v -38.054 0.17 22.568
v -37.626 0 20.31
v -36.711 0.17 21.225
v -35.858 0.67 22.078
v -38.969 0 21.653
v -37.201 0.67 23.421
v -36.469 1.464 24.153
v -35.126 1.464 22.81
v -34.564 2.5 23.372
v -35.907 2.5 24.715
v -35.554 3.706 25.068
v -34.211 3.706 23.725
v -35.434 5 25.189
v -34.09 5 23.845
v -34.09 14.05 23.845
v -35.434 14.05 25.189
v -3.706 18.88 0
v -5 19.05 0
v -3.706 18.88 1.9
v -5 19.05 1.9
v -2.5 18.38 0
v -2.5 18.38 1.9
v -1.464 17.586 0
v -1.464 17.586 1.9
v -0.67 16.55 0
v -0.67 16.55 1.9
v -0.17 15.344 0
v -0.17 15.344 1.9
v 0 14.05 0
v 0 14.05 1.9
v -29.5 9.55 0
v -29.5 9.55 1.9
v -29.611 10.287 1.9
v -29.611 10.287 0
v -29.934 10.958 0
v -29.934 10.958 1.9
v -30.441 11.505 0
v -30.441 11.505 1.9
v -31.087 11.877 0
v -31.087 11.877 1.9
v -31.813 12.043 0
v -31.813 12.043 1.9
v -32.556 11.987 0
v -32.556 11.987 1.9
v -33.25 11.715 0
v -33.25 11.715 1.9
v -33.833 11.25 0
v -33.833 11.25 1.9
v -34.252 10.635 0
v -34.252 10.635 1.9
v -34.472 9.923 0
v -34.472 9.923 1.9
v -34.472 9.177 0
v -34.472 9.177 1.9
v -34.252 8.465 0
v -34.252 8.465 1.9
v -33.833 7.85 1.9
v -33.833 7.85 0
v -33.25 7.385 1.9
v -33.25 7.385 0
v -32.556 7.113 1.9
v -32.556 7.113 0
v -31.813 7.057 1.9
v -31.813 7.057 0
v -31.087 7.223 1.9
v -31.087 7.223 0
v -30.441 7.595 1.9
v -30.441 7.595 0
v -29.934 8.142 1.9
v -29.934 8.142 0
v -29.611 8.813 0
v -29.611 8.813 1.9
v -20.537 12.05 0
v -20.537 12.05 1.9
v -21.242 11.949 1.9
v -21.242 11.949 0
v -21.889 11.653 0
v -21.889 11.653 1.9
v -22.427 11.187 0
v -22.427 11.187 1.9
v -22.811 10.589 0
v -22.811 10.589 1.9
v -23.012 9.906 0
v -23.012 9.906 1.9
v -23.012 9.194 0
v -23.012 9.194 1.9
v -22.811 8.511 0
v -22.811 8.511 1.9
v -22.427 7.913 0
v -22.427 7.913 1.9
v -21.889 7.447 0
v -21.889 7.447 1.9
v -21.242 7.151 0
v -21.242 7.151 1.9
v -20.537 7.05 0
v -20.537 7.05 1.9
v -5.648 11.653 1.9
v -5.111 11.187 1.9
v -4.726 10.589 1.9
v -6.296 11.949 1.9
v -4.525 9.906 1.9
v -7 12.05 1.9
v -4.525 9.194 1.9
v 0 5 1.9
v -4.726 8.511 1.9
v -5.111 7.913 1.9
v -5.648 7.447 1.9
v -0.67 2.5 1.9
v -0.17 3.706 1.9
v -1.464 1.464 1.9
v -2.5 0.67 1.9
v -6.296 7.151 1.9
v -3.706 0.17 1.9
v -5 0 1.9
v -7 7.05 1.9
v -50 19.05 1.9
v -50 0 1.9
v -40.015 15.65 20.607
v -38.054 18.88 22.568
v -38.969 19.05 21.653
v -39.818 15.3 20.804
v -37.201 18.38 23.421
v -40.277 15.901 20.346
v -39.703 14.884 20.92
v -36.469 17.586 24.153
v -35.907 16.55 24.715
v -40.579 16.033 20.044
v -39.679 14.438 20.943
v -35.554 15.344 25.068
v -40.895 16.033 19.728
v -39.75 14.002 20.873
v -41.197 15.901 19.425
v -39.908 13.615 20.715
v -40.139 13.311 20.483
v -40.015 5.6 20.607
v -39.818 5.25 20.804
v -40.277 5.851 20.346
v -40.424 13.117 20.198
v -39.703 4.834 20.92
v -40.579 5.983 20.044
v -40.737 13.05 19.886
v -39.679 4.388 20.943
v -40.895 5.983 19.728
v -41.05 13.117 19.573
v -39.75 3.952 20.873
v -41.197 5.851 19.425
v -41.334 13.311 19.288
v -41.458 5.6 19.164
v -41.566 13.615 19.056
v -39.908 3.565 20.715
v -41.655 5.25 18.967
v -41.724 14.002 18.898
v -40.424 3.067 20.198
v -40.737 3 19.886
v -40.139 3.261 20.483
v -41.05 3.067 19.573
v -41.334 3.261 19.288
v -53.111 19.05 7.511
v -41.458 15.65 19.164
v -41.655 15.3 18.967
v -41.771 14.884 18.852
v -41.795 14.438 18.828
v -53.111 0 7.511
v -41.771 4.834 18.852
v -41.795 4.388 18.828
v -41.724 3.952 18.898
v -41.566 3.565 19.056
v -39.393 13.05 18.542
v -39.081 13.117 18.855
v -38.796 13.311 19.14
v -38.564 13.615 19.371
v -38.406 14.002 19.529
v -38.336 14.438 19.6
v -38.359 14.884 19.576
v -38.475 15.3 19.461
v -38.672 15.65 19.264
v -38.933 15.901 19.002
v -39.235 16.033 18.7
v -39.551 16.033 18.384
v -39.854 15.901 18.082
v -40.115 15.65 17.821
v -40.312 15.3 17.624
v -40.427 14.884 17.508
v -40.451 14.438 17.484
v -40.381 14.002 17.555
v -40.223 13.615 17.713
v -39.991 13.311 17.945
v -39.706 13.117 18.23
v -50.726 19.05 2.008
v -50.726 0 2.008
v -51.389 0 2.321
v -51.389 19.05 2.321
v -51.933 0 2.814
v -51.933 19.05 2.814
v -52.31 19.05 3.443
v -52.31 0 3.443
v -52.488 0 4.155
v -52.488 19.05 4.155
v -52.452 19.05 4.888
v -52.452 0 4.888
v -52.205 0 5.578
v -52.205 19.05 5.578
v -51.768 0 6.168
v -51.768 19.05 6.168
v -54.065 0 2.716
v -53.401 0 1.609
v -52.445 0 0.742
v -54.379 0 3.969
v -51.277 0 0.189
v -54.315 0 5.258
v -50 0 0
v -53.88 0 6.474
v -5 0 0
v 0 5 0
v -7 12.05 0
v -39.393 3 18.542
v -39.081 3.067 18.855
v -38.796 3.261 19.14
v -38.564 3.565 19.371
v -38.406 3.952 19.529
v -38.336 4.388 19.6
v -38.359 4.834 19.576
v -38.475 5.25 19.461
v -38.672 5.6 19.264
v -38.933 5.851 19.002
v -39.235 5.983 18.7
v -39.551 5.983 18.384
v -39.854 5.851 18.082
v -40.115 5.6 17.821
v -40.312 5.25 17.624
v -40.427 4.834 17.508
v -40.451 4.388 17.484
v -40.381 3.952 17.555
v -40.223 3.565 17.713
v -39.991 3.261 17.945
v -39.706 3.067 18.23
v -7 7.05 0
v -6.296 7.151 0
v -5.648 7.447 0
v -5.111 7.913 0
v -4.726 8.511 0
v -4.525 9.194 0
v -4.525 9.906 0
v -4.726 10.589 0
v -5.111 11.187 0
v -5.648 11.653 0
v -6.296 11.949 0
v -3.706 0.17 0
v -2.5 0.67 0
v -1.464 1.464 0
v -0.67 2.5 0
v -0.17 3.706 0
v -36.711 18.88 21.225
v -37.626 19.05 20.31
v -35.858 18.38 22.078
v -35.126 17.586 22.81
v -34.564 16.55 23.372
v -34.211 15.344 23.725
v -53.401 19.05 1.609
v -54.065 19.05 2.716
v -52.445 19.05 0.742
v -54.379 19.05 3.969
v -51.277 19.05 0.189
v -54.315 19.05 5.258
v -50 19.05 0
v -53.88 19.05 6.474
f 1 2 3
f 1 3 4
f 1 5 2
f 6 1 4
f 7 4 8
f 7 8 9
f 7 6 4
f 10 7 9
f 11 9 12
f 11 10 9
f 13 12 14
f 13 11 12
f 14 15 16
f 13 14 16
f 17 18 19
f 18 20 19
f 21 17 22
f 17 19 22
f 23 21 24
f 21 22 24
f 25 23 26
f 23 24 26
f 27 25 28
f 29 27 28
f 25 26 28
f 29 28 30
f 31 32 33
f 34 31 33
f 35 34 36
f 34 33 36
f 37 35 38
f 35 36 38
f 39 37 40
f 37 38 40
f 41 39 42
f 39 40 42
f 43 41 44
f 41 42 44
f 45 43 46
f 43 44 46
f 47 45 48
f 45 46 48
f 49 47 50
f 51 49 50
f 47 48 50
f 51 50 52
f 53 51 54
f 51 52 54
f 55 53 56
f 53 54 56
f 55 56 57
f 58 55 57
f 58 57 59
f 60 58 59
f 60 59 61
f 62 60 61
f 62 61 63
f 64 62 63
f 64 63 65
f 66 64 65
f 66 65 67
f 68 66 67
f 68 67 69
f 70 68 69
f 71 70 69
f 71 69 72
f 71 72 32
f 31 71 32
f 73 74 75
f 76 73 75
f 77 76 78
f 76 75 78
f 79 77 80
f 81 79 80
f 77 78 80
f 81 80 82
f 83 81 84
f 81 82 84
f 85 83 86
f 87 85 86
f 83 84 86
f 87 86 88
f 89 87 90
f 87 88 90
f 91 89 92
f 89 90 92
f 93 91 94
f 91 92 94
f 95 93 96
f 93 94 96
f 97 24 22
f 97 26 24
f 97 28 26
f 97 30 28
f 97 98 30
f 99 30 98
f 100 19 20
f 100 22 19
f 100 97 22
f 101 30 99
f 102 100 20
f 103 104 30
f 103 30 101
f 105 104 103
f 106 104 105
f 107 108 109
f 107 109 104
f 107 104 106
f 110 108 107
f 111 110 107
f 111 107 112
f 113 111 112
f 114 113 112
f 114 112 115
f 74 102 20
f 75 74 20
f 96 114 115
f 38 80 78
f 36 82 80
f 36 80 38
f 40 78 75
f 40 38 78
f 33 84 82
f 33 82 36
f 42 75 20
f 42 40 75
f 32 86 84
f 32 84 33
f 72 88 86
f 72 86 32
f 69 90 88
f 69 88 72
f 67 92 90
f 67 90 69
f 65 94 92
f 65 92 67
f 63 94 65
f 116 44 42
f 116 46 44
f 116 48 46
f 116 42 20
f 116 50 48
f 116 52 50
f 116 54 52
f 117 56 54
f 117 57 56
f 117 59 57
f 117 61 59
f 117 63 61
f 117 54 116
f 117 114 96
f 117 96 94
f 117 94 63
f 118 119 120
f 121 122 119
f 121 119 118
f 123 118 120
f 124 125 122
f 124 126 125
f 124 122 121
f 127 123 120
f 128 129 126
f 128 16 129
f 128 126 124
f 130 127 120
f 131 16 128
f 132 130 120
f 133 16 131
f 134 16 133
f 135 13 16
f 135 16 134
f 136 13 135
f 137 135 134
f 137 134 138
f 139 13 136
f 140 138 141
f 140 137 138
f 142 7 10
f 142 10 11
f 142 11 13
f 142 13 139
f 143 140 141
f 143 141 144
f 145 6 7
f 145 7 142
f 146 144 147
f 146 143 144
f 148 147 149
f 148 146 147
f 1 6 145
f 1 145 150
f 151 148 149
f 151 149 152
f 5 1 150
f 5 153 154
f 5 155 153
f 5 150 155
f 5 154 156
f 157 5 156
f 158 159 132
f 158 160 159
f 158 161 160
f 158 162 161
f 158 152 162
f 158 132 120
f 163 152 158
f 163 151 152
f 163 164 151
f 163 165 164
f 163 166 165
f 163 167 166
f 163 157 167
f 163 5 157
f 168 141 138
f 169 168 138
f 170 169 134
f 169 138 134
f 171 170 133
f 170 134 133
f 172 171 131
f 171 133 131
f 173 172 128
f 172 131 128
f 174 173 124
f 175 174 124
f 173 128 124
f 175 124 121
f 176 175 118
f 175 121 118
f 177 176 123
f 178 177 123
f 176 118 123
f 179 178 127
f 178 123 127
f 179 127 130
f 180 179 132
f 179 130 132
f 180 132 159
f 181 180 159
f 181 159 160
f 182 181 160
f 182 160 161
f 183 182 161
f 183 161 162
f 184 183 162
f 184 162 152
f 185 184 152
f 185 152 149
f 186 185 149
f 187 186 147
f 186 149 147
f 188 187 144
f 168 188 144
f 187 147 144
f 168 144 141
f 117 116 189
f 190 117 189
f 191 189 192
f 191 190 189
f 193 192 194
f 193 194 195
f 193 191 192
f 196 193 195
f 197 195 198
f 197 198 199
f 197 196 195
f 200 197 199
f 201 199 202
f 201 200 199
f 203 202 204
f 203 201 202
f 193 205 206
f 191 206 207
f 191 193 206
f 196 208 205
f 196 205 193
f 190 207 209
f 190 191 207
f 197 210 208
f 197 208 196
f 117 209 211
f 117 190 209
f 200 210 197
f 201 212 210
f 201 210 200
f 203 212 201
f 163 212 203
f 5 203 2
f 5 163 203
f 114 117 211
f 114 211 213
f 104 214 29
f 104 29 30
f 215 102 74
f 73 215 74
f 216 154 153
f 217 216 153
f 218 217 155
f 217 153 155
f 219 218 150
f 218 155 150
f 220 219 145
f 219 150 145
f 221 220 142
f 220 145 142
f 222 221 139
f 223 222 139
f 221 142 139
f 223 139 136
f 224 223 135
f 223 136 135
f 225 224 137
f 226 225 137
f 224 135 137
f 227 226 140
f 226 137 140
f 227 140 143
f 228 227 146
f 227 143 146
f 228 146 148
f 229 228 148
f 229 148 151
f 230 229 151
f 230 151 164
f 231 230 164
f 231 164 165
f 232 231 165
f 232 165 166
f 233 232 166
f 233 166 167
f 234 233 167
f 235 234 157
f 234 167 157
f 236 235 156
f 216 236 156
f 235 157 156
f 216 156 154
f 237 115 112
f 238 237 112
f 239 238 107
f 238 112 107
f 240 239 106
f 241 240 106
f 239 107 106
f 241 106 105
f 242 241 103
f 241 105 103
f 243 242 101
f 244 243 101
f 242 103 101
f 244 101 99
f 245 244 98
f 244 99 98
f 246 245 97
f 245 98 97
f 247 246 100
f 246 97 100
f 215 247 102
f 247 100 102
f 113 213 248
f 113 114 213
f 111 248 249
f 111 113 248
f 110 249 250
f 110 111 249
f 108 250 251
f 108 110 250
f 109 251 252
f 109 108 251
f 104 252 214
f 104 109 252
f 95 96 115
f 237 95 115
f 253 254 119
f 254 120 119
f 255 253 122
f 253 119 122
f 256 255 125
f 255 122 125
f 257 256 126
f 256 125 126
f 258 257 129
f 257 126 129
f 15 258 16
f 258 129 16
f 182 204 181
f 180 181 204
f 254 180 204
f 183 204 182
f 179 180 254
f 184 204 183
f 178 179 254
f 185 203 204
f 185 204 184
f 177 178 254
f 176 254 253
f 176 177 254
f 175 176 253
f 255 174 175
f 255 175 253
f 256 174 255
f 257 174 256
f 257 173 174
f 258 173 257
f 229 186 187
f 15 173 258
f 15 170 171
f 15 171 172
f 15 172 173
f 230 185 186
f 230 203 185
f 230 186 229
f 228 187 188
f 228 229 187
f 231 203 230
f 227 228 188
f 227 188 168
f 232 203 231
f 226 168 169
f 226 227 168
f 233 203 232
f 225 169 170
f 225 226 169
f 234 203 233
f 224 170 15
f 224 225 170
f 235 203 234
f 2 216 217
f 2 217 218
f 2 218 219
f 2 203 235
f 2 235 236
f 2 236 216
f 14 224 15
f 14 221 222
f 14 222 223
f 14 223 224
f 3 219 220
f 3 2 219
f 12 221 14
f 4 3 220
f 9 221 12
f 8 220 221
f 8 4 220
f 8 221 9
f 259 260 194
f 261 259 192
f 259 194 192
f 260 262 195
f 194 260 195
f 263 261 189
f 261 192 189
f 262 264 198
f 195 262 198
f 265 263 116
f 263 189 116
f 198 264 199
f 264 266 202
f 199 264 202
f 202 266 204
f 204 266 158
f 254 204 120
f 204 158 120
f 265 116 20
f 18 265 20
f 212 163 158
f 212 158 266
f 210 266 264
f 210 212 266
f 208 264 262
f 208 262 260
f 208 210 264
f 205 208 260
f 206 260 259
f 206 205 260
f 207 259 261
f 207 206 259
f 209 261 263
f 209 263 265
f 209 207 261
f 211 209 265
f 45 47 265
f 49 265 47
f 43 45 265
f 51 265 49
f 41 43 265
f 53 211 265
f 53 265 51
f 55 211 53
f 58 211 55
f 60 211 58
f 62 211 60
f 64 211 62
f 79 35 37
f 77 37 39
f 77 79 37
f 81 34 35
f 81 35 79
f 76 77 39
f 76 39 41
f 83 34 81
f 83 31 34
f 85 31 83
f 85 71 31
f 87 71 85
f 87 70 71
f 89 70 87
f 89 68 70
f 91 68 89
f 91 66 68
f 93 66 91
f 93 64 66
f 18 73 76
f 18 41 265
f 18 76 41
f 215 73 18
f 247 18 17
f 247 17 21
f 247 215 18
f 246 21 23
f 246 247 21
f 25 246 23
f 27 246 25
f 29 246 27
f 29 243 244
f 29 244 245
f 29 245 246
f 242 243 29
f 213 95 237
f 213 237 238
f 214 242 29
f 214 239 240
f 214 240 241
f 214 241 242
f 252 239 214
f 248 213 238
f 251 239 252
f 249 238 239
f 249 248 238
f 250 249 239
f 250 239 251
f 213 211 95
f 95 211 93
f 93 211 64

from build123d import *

# Parameters (mm, degrees)
F1_DEPTH = 19.05
F2_R     = 1.5
F3_DEPTH = 1.9
F4_R     = 2.5
F5_DEPTH = 25
F6_R     = 5


with BuildPart() as f1:
    # F0 (on Front) → F1 (new body)
    with BuildSketch(Plane.XZ):
        with BuildLine():
            Line((-50, 0), (0, 0))
            Line((0, 0), (0, 1.9))
            Line((0, 1.9), (-50, 1.9))
            ThreePointArc((-50, 1.9), (-52.3096988313, 3.4432914191), (-51.767766953, 6.167766953))
            Line((-51.767766953, 6.167766953), (-34.0900974233, 23.8454364826))
            Line((-34.0900974233, 23.8454364826), (-35.4336003076, 25.1889393669))
            Line((-35.4336003076, 25.1889393669), (-53.1112698372, 7.5112698372))
            ThreePointArc((-53.1112698372, 7.5112698372), (-54.065069943, 2.7161928976), (-50, 0))
        make_face()
    extrude(amount=-F1_DEPTH)

    # F2 (on face) → F3 (cut, through all)
    with BuildSketch(Plane(origin=(-30.3112698372, 0, 30.3112698372), x_dir=(0, -1, 0), z_dir=(-0.7071067812, 0, 0.7071067812))):
        with Locations((-14.55, -14.7440692221)):
            Circle(F2_R)
        with Locations((-4.5, -14.7440692221)):
            Circle(F2_R)
    extrude(amount=-F3_DEPTH, mode=Mode.SUBTRACT)

    # F4 (on face) → F5 (cut)
    with BuildSketch(Plane.XY.offset(1.9)):
        with BuildLine():
            Line((-7, 12.05), (-20.5371917859, 12.05))
            ThreePointArc((-20.5371917859, 12.05), (-23.0371917859, 9.55), (-20.5371917859, 7.05))
            Line((-20.5371917859, 7.05), (-7, 7.05))
            ThreePointArc((-7, 7.05), (-4.5, 9.55), (-7, 12.05))
        make_face()
        with Locations((-32, 9.55)):
            Circle(F4_R)
    extrude(amount=-F5_DEPTH, mode=Mode.SUBTRACT)

    # F6
    f6_edges = [f1.edges().sort_by_distance(p)[0] for p in [
        (-34.761849, 0, 24.517188),
        (0, 0, 0.95),
        (-34.761849, 19.05, 24.517188),
        (0, 19.05, 0.95),
    ]]
    fillet(f6_edges, radius=F6_R)


solid = f1.part
